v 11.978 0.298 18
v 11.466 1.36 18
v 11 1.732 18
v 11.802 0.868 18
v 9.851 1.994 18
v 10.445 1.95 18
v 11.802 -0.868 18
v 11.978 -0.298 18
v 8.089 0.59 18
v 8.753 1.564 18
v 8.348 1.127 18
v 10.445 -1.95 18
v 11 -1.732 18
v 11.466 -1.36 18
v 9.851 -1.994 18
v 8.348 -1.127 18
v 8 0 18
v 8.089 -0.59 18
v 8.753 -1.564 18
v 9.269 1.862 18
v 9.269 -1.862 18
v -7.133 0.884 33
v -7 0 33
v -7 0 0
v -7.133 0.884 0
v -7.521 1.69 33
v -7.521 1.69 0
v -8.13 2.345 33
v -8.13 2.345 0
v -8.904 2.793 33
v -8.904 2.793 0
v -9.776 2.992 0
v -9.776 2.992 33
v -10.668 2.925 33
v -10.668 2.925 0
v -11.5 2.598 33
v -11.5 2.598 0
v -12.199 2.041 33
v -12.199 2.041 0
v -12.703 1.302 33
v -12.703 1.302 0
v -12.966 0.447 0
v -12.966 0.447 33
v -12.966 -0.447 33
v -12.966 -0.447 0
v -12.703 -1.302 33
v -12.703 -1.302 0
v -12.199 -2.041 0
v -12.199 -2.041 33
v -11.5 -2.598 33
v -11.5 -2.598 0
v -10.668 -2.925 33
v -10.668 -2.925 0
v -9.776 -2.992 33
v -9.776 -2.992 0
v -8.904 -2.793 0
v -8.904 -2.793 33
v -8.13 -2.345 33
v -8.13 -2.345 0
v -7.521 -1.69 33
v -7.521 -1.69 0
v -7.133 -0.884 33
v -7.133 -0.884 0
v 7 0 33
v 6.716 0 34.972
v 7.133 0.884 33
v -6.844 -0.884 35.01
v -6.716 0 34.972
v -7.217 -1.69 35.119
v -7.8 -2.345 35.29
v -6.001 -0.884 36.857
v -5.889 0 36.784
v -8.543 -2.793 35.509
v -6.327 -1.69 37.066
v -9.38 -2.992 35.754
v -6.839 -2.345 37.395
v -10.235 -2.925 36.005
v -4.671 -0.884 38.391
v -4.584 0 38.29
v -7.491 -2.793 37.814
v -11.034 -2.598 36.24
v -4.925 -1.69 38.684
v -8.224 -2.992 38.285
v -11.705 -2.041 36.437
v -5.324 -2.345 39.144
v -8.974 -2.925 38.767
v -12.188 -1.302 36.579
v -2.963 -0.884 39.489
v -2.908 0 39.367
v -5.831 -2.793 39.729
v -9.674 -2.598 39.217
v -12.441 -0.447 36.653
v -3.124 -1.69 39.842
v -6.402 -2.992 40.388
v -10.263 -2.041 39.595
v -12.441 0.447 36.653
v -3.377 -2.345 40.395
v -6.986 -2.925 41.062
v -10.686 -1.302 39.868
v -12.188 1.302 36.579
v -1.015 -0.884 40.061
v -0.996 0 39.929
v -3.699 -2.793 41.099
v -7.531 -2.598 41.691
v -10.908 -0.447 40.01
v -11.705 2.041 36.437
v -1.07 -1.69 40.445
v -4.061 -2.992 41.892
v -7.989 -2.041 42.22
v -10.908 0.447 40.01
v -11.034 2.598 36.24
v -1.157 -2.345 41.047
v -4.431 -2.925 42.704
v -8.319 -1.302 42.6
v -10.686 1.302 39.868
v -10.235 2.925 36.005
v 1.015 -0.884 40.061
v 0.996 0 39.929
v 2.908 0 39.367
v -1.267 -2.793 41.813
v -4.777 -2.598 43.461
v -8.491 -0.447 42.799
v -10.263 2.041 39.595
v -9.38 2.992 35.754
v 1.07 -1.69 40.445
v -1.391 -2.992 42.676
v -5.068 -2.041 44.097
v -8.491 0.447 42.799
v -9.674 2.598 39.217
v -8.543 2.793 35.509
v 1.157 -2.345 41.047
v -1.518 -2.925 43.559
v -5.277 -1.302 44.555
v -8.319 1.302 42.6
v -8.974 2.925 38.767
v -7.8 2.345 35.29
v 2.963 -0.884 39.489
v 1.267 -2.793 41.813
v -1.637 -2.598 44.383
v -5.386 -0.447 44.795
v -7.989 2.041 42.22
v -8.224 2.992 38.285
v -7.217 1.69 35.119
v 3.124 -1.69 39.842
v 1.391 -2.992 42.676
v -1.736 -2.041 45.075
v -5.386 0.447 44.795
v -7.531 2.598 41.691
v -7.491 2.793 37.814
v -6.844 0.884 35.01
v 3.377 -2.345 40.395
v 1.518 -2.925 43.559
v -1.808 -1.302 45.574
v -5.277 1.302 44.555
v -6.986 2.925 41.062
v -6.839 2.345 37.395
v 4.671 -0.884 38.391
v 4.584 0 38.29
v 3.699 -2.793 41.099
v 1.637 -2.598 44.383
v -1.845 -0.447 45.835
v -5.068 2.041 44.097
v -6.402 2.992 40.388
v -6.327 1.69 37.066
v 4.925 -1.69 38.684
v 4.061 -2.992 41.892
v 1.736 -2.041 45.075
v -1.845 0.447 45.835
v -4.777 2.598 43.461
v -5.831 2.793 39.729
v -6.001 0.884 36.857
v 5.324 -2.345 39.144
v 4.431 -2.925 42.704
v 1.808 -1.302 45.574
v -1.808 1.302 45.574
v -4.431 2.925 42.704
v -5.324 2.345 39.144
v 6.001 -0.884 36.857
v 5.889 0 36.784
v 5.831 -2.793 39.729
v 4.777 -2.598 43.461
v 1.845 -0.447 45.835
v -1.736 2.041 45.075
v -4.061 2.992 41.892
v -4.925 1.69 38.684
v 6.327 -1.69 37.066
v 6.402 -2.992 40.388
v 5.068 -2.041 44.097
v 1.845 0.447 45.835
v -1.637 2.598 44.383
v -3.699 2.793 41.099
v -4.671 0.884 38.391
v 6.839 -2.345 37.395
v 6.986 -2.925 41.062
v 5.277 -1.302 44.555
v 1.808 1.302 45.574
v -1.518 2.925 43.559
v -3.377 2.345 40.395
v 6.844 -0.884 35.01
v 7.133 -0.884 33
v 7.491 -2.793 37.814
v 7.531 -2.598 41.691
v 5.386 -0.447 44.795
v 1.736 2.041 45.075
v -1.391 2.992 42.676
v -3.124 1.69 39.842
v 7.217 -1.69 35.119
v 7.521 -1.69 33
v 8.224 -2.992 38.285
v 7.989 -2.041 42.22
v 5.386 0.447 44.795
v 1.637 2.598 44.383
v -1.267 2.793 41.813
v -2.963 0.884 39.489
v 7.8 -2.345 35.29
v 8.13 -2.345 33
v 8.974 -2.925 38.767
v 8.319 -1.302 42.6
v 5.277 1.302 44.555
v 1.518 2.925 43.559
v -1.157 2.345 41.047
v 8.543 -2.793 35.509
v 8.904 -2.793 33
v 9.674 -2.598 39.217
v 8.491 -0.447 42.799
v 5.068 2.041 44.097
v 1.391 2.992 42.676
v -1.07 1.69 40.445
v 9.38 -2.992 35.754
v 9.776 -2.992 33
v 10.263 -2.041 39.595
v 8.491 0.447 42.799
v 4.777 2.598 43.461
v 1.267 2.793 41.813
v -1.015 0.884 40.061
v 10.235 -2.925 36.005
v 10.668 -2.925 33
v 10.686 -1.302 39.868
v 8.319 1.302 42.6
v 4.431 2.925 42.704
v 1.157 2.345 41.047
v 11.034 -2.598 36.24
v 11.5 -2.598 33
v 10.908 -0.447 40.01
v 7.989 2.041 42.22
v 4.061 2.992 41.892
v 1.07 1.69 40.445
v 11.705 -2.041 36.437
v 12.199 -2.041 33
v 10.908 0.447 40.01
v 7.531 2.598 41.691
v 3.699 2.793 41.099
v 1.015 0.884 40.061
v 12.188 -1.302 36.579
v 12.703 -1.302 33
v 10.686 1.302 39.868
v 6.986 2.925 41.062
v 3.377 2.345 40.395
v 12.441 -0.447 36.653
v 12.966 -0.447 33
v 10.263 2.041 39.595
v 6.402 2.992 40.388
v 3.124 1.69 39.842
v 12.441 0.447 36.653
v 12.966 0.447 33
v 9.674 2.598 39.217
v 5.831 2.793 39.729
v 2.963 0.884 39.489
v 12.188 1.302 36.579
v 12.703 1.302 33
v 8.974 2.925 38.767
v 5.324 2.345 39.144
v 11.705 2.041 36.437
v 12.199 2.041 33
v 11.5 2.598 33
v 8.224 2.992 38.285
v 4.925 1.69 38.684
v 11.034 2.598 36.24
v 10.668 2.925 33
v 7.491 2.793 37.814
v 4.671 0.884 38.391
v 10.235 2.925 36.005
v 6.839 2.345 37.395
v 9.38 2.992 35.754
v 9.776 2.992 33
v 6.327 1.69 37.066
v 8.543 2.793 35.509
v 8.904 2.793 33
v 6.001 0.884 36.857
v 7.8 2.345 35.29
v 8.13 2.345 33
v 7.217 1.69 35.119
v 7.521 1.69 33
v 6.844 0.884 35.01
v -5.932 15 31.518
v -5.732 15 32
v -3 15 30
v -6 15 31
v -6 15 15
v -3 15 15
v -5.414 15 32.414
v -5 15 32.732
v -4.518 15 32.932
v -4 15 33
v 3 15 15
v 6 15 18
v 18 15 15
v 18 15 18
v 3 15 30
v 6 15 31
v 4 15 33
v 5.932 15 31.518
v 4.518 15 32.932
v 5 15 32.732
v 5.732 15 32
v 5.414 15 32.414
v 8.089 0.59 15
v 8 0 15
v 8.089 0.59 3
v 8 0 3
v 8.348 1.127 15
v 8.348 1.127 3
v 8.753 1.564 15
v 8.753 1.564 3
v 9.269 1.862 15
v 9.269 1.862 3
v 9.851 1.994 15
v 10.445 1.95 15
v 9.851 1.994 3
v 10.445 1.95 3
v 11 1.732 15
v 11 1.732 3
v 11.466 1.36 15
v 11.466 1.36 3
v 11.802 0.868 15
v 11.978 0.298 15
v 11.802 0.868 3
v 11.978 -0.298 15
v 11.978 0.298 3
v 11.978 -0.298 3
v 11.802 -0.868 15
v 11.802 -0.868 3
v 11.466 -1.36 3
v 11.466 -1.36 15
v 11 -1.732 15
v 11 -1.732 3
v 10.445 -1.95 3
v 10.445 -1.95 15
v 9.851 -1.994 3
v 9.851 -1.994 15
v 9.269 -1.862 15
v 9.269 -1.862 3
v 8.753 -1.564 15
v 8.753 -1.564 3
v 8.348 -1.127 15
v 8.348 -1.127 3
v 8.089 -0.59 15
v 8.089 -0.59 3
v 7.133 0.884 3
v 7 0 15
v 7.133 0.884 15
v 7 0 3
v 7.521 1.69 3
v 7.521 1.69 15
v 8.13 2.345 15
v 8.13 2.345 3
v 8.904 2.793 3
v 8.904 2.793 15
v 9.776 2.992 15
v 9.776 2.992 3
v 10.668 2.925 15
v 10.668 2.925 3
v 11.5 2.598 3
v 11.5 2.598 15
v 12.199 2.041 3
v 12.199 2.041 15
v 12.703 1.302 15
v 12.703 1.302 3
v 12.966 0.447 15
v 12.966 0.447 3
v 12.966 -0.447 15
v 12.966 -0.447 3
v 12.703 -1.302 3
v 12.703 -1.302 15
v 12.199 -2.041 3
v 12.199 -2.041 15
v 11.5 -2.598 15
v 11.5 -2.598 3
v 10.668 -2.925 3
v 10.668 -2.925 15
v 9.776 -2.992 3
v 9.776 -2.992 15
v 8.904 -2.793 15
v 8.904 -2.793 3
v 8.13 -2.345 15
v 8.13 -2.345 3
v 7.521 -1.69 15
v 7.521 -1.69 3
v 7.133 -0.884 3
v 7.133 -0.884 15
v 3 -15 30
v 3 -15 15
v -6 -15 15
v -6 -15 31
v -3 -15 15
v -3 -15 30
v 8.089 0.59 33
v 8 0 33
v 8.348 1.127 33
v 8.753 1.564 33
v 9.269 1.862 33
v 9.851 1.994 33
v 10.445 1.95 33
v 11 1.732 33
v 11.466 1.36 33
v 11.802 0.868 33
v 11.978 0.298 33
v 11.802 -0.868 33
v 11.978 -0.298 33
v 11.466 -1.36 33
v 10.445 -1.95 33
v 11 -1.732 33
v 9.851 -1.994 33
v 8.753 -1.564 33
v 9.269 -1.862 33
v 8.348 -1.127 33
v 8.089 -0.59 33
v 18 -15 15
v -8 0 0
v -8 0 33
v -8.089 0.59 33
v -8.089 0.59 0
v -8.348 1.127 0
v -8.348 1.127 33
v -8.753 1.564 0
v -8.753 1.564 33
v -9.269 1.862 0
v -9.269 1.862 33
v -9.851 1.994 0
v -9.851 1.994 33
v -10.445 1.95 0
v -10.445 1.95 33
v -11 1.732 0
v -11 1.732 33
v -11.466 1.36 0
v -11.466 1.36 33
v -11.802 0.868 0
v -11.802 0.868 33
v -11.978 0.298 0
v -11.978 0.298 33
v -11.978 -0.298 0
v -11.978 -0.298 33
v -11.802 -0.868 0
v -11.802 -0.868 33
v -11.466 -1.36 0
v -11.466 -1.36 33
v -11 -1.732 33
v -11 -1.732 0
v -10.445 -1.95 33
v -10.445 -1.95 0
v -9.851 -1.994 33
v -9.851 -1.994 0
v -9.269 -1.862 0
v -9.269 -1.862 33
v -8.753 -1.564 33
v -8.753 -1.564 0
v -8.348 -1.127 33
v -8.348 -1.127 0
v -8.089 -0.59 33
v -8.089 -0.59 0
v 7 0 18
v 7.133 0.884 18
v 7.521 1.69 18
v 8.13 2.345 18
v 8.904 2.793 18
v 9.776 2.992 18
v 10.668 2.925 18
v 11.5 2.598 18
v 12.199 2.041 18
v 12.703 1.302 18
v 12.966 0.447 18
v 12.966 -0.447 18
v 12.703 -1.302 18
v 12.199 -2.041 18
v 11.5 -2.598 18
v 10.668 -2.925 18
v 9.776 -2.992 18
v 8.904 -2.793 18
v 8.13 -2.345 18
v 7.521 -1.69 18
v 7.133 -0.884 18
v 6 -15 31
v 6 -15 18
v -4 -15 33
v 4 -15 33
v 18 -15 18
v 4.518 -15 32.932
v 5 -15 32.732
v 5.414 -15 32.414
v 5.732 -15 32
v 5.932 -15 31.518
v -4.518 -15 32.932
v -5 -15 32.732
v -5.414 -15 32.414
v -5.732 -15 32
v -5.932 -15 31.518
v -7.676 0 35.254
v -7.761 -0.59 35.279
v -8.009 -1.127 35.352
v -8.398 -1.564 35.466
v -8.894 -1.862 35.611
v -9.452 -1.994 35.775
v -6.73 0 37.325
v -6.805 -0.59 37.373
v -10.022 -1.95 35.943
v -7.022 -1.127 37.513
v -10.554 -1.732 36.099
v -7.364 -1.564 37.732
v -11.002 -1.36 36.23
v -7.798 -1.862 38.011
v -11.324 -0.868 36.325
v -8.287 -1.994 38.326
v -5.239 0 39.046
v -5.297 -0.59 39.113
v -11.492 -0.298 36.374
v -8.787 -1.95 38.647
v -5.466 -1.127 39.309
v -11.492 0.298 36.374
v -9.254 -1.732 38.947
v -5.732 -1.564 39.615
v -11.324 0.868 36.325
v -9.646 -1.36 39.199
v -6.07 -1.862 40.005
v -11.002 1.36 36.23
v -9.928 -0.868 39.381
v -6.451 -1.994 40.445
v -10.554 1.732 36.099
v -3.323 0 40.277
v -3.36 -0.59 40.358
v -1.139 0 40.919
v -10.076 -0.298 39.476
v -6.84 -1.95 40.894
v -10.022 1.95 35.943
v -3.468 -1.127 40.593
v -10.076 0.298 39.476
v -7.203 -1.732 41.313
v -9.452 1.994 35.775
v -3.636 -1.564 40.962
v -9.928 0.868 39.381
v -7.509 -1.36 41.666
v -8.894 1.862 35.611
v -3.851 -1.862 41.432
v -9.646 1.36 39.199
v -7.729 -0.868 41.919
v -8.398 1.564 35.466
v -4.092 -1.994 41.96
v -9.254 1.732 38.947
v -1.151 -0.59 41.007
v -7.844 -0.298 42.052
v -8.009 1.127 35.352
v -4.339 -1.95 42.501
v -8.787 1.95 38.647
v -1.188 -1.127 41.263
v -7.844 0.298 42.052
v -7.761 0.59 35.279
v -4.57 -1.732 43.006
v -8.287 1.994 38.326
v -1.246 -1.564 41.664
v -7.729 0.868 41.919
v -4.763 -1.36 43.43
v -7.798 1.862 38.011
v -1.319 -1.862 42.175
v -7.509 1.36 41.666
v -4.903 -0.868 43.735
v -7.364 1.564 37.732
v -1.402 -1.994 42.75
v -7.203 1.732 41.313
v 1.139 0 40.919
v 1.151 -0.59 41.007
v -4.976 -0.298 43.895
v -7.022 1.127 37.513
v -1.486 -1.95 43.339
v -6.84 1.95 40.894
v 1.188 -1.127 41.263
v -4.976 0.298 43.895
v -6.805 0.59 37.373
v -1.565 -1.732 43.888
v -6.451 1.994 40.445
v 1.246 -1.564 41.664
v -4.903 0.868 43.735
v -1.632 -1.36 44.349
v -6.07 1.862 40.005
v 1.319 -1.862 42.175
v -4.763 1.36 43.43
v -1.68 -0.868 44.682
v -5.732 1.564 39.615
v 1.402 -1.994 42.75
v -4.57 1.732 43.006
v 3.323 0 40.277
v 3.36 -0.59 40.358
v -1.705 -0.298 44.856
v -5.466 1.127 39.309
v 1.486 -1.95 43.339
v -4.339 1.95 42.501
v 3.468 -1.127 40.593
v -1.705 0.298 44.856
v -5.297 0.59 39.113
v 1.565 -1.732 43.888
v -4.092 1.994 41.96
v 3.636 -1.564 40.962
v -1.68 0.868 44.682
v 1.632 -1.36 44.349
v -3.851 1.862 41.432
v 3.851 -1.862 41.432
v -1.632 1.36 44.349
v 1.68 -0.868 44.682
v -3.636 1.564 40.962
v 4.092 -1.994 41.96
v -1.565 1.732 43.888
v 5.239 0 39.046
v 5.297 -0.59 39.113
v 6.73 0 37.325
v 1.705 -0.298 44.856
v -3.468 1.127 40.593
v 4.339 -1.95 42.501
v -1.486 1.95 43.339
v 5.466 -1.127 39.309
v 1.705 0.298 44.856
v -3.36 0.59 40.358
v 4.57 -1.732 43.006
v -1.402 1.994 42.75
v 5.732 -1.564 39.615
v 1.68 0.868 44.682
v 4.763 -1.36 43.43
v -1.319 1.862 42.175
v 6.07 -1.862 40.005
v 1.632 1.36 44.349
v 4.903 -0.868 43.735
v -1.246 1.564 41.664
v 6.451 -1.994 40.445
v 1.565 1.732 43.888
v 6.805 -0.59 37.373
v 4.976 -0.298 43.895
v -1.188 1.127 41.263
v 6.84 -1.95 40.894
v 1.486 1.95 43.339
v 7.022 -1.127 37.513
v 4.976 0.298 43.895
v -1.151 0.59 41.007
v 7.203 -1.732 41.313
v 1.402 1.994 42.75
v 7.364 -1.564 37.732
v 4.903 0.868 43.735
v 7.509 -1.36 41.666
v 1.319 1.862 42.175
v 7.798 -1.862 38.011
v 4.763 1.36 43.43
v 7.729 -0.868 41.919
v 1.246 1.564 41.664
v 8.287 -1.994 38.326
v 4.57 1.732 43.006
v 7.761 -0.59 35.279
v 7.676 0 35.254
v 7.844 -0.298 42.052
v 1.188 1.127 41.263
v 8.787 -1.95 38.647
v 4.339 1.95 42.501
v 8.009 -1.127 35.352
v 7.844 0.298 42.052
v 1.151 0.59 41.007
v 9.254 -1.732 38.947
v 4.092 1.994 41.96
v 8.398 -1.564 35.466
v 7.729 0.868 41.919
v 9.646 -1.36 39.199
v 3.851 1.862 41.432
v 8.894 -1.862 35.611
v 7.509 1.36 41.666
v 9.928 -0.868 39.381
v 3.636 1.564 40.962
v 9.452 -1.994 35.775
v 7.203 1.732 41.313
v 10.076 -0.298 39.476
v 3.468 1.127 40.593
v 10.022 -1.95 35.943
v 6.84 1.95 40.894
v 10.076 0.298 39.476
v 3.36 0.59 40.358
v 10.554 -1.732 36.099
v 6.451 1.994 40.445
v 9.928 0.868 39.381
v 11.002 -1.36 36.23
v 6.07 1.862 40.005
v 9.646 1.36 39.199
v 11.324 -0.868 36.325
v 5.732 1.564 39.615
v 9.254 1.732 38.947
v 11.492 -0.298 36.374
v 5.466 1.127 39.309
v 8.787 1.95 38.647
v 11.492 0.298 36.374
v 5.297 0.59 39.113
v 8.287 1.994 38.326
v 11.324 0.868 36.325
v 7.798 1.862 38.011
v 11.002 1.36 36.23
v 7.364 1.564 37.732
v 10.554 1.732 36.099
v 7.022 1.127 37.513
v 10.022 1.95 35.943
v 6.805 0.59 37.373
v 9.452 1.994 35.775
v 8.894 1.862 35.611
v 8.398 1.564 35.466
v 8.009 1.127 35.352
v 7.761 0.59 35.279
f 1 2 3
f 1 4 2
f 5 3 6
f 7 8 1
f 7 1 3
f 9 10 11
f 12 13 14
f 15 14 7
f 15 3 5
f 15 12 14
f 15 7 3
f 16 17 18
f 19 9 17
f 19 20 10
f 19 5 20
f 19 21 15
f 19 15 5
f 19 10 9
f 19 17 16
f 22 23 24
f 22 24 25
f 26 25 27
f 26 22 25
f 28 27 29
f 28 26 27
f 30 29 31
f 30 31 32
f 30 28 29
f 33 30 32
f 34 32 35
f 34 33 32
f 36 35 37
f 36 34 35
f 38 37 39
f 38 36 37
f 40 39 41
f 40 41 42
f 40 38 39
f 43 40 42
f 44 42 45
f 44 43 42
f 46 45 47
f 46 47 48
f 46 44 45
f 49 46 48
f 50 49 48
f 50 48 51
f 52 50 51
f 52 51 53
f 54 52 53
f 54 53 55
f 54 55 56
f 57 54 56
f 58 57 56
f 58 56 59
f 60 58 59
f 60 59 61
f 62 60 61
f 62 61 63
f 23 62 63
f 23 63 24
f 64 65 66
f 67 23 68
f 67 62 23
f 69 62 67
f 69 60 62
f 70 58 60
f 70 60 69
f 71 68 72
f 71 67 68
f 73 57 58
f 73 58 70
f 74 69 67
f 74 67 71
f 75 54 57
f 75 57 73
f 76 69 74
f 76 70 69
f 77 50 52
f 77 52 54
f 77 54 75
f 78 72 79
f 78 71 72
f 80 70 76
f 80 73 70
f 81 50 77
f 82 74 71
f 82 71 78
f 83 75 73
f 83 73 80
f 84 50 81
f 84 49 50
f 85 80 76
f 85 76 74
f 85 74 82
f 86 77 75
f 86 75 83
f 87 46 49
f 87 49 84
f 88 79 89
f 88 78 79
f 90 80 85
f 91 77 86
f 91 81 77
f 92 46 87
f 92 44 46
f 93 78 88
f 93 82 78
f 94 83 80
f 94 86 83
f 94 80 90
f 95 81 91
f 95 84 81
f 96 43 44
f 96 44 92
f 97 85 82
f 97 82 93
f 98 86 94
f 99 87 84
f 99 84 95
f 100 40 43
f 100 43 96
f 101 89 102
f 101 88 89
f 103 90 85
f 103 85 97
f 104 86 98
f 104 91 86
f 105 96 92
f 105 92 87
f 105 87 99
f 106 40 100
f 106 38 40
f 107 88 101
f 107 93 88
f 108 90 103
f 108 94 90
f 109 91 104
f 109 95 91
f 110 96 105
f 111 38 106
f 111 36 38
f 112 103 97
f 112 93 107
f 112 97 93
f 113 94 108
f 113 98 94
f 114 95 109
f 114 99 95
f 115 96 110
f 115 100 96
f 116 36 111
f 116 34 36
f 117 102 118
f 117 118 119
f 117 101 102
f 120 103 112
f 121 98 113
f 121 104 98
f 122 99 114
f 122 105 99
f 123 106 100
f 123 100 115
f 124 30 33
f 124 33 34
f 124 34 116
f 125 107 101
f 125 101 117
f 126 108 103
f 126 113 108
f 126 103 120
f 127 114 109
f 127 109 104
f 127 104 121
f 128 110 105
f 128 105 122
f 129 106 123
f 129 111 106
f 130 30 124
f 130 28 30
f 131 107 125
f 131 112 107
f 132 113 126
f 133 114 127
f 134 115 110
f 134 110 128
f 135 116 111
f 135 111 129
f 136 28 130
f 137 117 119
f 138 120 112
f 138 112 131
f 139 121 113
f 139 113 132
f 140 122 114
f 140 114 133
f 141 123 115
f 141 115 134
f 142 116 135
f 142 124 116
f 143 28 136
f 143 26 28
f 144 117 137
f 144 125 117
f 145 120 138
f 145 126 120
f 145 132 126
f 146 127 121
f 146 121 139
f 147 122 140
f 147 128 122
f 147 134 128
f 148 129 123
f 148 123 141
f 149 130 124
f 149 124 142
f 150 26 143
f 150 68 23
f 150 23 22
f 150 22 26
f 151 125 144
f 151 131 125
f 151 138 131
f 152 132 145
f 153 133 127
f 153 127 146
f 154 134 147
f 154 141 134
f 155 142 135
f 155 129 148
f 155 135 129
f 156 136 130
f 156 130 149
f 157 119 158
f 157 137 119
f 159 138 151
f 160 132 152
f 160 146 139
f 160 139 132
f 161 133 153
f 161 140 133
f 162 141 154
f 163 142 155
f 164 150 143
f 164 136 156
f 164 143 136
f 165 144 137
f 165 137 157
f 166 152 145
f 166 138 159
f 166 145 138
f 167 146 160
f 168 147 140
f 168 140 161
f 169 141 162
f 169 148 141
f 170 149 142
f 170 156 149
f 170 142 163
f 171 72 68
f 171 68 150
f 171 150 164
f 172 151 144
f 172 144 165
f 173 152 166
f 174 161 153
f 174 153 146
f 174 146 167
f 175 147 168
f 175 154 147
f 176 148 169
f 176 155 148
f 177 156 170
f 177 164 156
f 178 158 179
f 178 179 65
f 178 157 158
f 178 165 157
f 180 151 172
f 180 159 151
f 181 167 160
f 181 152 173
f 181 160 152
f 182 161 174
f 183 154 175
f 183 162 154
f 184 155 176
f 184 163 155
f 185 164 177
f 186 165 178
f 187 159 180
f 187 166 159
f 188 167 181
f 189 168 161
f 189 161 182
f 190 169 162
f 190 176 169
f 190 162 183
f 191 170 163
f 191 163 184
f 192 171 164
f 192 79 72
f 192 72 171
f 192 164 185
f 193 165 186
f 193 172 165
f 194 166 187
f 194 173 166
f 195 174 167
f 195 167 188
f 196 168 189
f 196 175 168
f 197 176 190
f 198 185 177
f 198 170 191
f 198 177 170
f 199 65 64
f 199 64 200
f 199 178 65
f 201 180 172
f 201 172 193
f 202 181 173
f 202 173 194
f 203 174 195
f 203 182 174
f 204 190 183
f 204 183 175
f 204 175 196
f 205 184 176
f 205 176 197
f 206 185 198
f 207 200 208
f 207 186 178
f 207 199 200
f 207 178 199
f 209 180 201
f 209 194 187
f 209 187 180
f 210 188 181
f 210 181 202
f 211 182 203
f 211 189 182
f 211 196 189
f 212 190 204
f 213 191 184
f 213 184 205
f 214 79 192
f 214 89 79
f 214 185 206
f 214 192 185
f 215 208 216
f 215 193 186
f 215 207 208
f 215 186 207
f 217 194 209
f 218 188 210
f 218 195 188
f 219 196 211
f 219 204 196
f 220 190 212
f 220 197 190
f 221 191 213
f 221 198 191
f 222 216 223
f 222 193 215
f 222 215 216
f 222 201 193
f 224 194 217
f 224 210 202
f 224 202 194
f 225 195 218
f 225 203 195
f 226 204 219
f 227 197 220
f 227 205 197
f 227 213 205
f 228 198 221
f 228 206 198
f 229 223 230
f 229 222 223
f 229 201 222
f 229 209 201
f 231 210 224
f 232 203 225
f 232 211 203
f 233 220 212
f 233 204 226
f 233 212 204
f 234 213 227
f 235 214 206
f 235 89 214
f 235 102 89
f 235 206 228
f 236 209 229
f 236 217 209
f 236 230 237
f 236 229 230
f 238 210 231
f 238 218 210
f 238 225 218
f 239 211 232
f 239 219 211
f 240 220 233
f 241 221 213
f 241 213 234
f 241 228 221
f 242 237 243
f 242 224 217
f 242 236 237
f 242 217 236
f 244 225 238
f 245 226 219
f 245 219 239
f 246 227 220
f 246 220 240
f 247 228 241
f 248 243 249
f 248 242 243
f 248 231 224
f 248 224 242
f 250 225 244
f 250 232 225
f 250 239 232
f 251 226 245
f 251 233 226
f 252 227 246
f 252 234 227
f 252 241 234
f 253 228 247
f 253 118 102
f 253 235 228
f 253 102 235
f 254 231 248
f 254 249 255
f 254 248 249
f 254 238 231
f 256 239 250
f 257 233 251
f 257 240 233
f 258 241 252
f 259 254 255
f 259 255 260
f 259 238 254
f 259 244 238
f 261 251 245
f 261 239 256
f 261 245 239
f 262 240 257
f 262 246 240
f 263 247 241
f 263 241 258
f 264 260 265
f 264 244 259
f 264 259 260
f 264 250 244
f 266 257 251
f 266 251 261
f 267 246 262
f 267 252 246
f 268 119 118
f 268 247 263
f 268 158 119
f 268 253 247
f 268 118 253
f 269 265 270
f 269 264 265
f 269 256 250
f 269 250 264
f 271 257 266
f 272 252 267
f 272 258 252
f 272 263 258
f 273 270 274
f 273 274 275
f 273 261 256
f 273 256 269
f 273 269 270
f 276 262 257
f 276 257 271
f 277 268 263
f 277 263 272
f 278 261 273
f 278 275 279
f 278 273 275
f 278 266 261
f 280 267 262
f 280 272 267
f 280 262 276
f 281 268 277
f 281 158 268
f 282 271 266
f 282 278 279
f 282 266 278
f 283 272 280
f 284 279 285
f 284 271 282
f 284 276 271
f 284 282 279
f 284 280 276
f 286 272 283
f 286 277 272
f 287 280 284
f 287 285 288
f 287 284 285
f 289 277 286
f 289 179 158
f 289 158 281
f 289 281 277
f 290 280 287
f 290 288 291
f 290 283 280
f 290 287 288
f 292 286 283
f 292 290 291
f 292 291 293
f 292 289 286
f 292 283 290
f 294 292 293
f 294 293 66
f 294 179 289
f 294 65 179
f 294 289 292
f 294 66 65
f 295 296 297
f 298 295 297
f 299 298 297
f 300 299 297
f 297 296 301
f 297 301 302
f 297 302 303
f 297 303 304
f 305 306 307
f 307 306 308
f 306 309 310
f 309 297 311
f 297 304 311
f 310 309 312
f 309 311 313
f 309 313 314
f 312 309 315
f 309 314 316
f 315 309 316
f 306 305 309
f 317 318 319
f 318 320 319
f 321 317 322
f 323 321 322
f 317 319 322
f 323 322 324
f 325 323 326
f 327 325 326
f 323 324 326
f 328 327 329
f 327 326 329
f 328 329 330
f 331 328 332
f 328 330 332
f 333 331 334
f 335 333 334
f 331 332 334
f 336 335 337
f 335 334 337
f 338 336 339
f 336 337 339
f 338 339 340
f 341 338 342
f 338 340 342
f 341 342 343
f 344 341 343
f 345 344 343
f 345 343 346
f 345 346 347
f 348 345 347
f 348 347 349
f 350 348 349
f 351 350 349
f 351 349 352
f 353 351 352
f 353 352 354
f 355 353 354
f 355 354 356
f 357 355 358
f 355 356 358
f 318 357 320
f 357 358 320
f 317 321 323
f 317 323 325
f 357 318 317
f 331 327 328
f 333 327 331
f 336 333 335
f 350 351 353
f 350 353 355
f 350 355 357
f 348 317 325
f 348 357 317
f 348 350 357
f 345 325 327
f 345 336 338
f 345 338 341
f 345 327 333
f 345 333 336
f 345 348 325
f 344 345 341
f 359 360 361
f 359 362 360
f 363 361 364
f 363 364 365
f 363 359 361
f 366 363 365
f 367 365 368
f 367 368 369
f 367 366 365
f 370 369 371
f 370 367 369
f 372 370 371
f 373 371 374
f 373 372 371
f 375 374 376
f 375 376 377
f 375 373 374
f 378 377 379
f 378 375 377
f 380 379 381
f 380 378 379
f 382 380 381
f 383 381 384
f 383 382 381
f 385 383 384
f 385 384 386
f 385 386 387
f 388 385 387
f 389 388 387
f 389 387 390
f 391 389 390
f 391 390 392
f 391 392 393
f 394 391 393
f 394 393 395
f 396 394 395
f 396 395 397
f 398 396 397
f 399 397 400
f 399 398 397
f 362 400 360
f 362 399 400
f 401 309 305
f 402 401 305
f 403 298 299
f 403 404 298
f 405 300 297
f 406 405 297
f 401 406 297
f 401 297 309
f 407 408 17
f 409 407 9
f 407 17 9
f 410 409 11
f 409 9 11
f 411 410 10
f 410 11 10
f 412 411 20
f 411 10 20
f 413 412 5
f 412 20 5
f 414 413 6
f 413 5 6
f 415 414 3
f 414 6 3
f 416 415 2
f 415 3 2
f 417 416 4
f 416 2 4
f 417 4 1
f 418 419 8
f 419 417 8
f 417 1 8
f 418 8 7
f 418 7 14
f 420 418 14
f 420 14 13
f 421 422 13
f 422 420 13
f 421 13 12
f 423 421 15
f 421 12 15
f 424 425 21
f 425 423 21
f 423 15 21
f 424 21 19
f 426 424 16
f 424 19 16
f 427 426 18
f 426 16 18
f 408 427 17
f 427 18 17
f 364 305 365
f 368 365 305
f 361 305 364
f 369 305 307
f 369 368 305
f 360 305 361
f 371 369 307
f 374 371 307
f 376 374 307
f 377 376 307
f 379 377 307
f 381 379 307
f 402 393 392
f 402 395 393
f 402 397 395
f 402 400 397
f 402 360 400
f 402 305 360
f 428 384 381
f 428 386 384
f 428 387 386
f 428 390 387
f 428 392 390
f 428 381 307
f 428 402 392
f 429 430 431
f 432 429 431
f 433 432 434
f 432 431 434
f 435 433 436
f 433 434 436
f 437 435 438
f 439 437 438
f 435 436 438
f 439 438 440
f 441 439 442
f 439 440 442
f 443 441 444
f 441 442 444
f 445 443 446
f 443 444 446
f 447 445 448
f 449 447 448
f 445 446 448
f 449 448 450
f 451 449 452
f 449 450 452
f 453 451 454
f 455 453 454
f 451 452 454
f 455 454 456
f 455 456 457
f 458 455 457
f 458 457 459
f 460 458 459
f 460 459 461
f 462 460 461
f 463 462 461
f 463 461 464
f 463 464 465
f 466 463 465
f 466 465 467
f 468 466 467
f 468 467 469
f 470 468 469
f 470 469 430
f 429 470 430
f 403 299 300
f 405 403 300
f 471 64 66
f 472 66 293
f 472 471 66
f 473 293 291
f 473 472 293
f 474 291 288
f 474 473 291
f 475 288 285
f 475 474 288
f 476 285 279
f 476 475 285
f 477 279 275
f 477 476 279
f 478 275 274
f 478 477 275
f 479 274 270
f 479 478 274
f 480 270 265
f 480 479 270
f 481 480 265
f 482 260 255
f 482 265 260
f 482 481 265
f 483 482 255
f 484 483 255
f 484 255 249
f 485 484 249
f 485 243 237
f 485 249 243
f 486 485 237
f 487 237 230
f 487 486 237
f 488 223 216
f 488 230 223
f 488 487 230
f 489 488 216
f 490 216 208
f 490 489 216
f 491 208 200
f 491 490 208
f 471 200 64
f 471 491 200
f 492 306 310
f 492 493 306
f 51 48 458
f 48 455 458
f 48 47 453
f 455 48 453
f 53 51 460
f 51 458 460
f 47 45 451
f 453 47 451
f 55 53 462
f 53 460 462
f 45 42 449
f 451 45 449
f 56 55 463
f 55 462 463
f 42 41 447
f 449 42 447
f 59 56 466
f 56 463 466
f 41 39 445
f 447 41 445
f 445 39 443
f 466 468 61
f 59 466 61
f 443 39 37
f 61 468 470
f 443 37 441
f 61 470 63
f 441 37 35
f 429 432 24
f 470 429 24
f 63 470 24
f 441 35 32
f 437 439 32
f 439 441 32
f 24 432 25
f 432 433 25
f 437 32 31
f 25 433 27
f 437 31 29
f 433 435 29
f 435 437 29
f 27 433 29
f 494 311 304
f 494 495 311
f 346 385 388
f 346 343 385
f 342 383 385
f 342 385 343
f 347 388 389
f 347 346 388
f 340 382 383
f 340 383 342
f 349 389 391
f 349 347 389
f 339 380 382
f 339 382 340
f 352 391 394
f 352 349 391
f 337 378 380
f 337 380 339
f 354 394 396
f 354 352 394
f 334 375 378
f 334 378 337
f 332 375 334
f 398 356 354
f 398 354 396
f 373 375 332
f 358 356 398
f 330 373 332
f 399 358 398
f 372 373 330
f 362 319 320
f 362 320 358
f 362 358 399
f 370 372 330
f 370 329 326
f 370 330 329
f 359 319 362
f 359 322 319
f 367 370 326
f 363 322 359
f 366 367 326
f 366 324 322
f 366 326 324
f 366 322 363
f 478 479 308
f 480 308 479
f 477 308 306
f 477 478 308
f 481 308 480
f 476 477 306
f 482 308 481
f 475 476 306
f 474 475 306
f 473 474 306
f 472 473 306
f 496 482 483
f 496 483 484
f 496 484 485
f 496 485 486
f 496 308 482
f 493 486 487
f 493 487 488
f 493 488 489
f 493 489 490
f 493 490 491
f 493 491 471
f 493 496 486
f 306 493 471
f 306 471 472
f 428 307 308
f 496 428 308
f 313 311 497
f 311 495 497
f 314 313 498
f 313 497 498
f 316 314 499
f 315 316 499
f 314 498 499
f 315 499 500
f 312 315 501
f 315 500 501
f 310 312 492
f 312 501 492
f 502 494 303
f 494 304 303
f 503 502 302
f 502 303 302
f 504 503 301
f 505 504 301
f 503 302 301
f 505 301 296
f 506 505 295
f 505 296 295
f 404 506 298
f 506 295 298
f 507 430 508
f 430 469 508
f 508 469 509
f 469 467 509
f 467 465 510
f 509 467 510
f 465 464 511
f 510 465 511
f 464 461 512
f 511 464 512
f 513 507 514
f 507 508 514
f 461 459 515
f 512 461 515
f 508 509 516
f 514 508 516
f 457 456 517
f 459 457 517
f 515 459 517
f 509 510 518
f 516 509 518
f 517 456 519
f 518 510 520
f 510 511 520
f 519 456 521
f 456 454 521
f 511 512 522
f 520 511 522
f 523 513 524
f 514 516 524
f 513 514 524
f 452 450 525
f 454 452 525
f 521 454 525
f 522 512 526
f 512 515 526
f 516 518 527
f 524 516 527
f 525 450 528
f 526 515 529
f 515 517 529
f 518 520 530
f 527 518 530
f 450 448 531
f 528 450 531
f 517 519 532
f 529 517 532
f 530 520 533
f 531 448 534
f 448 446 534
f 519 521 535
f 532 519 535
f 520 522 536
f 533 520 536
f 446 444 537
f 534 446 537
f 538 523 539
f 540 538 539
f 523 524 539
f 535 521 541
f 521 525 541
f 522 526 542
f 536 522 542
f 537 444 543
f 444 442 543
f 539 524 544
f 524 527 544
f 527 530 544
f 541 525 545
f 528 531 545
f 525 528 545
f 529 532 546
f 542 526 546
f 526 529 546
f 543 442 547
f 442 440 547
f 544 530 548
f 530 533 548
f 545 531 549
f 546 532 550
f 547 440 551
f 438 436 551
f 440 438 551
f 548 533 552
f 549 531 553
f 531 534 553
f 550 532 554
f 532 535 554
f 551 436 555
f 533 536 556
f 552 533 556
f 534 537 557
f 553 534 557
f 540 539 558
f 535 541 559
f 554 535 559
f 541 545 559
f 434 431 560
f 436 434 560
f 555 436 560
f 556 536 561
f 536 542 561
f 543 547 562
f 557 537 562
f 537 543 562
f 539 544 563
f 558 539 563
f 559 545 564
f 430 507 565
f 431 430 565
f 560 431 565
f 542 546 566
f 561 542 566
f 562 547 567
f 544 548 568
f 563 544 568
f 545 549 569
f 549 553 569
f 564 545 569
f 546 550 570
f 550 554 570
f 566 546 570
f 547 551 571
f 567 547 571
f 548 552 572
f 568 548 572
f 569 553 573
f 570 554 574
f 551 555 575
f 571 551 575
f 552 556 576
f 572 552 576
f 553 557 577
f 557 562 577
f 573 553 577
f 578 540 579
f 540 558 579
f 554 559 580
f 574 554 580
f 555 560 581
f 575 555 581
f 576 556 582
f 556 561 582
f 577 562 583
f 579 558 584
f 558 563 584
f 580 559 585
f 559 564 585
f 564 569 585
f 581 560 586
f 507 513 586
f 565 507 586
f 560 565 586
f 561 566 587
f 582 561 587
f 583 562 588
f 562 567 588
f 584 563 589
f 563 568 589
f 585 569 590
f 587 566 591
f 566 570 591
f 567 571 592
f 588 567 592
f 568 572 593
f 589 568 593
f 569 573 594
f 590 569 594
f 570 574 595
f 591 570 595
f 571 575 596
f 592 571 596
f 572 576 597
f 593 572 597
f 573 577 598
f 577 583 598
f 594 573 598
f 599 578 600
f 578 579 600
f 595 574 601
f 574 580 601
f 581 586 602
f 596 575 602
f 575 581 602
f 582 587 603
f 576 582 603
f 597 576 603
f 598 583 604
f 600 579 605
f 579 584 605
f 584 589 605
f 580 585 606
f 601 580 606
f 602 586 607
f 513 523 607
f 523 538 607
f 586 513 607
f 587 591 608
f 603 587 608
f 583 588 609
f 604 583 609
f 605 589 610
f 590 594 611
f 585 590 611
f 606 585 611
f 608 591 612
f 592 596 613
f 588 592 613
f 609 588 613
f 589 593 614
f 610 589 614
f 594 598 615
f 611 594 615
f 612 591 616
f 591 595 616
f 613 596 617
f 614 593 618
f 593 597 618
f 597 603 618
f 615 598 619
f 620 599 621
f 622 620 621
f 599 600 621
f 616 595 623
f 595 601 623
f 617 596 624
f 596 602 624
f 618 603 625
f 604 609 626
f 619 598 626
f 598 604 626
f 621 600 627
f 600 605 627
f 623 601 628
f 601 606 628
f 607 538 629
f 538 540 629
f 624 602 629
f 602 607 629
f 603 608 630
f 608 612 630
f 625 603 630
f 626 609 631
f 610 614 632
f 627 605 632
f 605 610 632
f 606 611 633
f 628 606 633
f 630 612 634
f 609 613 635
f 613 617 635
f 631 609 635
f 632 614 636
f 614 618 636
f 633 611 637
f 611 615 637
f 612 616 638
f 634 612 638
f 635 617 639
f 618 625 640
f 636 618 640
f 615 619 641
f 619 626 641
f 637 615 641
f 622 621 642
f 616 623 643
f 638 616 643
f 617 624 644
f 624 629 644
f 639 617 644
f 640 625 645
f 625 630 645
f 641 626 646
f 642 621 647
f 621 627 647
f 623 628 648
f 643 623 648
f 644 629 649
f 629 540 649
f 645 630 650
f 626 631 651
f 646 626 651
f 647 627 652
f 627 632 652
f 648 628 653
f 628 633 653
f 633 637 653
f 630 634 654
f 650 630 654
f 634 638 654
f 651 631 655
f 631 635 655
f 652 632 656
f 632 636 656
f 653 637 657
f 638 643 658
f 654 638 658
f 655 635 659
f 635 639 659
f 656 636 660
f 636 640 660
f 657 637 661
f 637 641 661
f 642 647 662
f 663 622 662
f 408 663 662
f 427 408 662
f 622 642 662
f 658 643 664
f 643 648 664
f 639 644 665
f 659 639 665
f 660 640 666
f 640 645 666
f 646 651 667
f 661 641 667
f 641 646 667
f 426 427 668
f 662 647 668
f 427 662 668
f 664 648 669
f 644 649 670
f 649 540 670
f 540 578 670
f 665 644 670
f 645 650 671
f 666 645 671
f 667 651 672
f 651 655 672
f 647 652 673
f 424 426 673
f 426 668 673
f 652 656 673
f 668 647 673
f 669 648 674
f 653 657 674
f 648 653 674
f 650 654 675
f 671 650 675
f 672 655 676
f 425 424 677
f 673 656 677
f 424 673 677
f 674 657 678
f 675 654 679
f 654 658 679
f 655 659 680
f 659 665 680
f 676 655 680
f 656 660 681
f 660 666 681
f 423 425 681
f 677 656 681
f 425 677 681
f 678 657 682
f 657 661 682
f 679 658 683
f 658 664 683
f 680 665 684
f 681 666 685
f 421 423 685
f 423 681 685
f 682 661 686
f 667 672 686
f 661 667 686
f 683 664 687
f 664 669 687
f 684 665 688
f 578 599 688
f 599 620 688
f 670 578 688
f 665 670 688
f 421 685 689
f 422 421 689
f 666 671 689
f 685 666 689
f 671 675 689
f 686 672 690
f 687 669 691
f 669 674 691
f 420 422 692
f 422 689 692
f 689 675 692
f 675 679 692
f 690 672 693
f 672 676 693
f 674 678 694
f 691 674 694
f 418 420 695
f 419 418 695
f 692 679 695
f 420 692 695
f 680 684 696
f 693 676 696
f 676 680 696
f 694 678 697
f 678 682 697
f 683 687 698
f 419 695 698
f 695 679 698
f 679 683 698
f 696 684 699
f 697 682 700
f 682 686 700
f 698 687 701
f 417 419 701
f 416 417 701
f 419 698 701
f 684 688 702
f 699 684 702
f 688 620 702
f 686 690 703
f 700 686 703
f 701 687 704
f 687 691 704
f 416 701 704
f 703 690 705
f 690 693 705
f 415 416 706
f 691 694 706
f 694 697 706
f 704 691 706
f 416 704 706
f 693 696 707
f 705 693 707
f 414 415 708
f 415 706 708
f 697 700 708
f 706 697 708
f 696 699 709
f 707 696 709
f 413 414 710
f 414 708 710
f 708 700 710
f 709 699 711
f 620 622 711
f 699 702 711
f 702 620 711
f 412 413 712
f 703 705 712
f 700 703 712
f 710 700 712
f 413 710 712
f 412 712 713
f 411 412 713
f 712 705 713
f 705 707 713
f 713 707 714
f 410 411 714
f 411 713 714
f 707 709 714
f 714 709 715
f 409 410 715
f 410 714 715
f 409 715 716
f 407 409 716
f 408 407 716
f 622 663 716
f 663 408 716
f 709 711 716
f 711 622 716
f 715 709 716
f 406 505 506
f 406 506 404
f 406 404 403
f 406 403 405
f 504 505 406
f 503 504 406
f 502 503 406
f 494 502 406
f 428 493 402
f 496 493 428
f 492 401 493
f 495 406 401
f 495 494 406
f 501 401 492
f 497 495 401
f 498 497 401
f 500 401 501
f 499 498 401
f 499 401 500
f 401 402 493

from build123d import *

# Parameters (mm, degrees)
F1_DEPTH = 15
F2_R     = 2
F3_R     = 2
F5_R     = 3
F5_R_2   = 1.9999997224


with BuildPart() as f1:
    # F0 (on Front) → F1 (new body, symmetric)
    with BuildSketch(Plane.XZ):
        Polygon((-3, 15), (-3, 30), (3, 30), (3, 15), (18, 15), (18, 18), (6, 18), (6, 33), (-6, 33), (-6, 15), align=None)
    extrude(amount=F1_DEPTH, both=True)

    # F2
    f2_edges = [f1.edges().sort_by_distance(p)[0] for p in [
        (6, 0, 33),
    ]]
    fillet(f2_edges, radius=F2_R)

    # F3
    f3_edges = [f1.edges().sort_by_distance(p)[0] for p in [
        (-6, 0, 33),
    ]]
    fillet(f3_edges, radius=F3_R)

    # F6: sweep along a path in F4
    with BuildLine(Plane.XZ) as f6_path:
        Line((-10, 0), (-10, 33))
        ThreePointArc((-10, 33), (0, 43), (10, 33))
        Line((10, 33), (10, 3))
    # F5 (on Top) → F6 (sweep)
    with BuildSketch(Plane.XY):
        with Locations((-10, 0)):
            Circle(F5_R)
        with Locations((-10, 0)):
            Circle(F5_R_2, mode=Mode.SUBTRACT)
    sweep(path=f6_path.line)


solid = f1.part
